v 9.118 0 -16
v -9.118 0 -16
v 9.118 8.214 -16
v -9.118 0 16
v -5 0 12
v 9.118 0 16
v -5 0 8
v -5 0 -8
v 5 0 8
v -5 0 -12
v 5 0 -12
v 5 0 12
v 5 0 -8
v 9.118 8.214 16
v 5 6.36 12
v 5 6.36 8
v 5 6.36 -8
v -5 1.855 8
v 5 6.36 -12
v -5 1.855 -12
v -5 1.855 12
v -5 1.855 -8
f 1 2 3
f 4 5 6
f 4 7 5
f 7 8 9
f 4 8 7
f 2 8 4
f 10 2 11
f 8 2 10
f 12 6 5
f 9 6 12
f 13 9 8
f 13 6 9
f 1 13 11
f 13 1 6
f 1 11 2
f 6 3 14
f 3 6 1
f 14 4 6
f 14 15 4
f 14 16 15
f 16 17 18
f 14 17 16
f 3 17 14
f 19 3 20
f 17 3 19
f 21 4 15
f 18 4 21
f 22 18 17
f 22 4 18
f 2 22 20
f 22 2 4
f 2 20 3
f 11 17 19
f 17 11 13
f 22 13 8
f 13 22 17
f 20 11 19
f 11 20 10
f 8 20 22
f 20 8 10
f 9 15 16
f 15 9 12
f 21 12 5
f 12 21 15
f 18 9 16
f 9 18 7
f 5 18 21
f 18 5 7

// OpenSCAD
/*
Copyright (C) Saeed Gholami Shahbandi. All rights reserved.
Author: Saeed Gholami Shahbandi (saeed.gh.sh@gmail.com)

This file is part of Arrangement Library.
The of Arrangement Library is free software: you can redistribute it and/or
modify it under the terms of the GNU Lesser General Public License as published
by the Free Software Foundation, either version 3 of the License,
or (at your option) any later version.

This program is distributed in the hope that it will be useful, but WITHOUT ANY
WARRANTY; without even the implied warranty of MERCHANTABILITY or FITNESS FOR A
PARTICULAR PURPOSE. See the GNU Lesser General Public License for more details.

You should have received a copy of the GNU Lesser General Public License along
with this program. If not, see <http://www.gnu.org/licenses/>
*/

tol = 0.02;

alpha = 24.25;
x = 20.0 * cos(alpha);
y = 20.0 * sin(alpha);
h = 32.0;
points = [[0.0, 0.0],
	  [x, 0.0],
	  [x, y]];

module wedge()
{
  translate([-x/2, 0, -h/2])
    linear_extrude(height=h)
    polygon(points);
}

module slot()
{
  color("Red", alpha=0.5)
    cube(size=[10.0, 100.0, 4.0], center=true);
}

difference(){
  wedge();

  translate([0, 0, -10])
  slot();

  translate([0, 0, 10])
  slot();
}
